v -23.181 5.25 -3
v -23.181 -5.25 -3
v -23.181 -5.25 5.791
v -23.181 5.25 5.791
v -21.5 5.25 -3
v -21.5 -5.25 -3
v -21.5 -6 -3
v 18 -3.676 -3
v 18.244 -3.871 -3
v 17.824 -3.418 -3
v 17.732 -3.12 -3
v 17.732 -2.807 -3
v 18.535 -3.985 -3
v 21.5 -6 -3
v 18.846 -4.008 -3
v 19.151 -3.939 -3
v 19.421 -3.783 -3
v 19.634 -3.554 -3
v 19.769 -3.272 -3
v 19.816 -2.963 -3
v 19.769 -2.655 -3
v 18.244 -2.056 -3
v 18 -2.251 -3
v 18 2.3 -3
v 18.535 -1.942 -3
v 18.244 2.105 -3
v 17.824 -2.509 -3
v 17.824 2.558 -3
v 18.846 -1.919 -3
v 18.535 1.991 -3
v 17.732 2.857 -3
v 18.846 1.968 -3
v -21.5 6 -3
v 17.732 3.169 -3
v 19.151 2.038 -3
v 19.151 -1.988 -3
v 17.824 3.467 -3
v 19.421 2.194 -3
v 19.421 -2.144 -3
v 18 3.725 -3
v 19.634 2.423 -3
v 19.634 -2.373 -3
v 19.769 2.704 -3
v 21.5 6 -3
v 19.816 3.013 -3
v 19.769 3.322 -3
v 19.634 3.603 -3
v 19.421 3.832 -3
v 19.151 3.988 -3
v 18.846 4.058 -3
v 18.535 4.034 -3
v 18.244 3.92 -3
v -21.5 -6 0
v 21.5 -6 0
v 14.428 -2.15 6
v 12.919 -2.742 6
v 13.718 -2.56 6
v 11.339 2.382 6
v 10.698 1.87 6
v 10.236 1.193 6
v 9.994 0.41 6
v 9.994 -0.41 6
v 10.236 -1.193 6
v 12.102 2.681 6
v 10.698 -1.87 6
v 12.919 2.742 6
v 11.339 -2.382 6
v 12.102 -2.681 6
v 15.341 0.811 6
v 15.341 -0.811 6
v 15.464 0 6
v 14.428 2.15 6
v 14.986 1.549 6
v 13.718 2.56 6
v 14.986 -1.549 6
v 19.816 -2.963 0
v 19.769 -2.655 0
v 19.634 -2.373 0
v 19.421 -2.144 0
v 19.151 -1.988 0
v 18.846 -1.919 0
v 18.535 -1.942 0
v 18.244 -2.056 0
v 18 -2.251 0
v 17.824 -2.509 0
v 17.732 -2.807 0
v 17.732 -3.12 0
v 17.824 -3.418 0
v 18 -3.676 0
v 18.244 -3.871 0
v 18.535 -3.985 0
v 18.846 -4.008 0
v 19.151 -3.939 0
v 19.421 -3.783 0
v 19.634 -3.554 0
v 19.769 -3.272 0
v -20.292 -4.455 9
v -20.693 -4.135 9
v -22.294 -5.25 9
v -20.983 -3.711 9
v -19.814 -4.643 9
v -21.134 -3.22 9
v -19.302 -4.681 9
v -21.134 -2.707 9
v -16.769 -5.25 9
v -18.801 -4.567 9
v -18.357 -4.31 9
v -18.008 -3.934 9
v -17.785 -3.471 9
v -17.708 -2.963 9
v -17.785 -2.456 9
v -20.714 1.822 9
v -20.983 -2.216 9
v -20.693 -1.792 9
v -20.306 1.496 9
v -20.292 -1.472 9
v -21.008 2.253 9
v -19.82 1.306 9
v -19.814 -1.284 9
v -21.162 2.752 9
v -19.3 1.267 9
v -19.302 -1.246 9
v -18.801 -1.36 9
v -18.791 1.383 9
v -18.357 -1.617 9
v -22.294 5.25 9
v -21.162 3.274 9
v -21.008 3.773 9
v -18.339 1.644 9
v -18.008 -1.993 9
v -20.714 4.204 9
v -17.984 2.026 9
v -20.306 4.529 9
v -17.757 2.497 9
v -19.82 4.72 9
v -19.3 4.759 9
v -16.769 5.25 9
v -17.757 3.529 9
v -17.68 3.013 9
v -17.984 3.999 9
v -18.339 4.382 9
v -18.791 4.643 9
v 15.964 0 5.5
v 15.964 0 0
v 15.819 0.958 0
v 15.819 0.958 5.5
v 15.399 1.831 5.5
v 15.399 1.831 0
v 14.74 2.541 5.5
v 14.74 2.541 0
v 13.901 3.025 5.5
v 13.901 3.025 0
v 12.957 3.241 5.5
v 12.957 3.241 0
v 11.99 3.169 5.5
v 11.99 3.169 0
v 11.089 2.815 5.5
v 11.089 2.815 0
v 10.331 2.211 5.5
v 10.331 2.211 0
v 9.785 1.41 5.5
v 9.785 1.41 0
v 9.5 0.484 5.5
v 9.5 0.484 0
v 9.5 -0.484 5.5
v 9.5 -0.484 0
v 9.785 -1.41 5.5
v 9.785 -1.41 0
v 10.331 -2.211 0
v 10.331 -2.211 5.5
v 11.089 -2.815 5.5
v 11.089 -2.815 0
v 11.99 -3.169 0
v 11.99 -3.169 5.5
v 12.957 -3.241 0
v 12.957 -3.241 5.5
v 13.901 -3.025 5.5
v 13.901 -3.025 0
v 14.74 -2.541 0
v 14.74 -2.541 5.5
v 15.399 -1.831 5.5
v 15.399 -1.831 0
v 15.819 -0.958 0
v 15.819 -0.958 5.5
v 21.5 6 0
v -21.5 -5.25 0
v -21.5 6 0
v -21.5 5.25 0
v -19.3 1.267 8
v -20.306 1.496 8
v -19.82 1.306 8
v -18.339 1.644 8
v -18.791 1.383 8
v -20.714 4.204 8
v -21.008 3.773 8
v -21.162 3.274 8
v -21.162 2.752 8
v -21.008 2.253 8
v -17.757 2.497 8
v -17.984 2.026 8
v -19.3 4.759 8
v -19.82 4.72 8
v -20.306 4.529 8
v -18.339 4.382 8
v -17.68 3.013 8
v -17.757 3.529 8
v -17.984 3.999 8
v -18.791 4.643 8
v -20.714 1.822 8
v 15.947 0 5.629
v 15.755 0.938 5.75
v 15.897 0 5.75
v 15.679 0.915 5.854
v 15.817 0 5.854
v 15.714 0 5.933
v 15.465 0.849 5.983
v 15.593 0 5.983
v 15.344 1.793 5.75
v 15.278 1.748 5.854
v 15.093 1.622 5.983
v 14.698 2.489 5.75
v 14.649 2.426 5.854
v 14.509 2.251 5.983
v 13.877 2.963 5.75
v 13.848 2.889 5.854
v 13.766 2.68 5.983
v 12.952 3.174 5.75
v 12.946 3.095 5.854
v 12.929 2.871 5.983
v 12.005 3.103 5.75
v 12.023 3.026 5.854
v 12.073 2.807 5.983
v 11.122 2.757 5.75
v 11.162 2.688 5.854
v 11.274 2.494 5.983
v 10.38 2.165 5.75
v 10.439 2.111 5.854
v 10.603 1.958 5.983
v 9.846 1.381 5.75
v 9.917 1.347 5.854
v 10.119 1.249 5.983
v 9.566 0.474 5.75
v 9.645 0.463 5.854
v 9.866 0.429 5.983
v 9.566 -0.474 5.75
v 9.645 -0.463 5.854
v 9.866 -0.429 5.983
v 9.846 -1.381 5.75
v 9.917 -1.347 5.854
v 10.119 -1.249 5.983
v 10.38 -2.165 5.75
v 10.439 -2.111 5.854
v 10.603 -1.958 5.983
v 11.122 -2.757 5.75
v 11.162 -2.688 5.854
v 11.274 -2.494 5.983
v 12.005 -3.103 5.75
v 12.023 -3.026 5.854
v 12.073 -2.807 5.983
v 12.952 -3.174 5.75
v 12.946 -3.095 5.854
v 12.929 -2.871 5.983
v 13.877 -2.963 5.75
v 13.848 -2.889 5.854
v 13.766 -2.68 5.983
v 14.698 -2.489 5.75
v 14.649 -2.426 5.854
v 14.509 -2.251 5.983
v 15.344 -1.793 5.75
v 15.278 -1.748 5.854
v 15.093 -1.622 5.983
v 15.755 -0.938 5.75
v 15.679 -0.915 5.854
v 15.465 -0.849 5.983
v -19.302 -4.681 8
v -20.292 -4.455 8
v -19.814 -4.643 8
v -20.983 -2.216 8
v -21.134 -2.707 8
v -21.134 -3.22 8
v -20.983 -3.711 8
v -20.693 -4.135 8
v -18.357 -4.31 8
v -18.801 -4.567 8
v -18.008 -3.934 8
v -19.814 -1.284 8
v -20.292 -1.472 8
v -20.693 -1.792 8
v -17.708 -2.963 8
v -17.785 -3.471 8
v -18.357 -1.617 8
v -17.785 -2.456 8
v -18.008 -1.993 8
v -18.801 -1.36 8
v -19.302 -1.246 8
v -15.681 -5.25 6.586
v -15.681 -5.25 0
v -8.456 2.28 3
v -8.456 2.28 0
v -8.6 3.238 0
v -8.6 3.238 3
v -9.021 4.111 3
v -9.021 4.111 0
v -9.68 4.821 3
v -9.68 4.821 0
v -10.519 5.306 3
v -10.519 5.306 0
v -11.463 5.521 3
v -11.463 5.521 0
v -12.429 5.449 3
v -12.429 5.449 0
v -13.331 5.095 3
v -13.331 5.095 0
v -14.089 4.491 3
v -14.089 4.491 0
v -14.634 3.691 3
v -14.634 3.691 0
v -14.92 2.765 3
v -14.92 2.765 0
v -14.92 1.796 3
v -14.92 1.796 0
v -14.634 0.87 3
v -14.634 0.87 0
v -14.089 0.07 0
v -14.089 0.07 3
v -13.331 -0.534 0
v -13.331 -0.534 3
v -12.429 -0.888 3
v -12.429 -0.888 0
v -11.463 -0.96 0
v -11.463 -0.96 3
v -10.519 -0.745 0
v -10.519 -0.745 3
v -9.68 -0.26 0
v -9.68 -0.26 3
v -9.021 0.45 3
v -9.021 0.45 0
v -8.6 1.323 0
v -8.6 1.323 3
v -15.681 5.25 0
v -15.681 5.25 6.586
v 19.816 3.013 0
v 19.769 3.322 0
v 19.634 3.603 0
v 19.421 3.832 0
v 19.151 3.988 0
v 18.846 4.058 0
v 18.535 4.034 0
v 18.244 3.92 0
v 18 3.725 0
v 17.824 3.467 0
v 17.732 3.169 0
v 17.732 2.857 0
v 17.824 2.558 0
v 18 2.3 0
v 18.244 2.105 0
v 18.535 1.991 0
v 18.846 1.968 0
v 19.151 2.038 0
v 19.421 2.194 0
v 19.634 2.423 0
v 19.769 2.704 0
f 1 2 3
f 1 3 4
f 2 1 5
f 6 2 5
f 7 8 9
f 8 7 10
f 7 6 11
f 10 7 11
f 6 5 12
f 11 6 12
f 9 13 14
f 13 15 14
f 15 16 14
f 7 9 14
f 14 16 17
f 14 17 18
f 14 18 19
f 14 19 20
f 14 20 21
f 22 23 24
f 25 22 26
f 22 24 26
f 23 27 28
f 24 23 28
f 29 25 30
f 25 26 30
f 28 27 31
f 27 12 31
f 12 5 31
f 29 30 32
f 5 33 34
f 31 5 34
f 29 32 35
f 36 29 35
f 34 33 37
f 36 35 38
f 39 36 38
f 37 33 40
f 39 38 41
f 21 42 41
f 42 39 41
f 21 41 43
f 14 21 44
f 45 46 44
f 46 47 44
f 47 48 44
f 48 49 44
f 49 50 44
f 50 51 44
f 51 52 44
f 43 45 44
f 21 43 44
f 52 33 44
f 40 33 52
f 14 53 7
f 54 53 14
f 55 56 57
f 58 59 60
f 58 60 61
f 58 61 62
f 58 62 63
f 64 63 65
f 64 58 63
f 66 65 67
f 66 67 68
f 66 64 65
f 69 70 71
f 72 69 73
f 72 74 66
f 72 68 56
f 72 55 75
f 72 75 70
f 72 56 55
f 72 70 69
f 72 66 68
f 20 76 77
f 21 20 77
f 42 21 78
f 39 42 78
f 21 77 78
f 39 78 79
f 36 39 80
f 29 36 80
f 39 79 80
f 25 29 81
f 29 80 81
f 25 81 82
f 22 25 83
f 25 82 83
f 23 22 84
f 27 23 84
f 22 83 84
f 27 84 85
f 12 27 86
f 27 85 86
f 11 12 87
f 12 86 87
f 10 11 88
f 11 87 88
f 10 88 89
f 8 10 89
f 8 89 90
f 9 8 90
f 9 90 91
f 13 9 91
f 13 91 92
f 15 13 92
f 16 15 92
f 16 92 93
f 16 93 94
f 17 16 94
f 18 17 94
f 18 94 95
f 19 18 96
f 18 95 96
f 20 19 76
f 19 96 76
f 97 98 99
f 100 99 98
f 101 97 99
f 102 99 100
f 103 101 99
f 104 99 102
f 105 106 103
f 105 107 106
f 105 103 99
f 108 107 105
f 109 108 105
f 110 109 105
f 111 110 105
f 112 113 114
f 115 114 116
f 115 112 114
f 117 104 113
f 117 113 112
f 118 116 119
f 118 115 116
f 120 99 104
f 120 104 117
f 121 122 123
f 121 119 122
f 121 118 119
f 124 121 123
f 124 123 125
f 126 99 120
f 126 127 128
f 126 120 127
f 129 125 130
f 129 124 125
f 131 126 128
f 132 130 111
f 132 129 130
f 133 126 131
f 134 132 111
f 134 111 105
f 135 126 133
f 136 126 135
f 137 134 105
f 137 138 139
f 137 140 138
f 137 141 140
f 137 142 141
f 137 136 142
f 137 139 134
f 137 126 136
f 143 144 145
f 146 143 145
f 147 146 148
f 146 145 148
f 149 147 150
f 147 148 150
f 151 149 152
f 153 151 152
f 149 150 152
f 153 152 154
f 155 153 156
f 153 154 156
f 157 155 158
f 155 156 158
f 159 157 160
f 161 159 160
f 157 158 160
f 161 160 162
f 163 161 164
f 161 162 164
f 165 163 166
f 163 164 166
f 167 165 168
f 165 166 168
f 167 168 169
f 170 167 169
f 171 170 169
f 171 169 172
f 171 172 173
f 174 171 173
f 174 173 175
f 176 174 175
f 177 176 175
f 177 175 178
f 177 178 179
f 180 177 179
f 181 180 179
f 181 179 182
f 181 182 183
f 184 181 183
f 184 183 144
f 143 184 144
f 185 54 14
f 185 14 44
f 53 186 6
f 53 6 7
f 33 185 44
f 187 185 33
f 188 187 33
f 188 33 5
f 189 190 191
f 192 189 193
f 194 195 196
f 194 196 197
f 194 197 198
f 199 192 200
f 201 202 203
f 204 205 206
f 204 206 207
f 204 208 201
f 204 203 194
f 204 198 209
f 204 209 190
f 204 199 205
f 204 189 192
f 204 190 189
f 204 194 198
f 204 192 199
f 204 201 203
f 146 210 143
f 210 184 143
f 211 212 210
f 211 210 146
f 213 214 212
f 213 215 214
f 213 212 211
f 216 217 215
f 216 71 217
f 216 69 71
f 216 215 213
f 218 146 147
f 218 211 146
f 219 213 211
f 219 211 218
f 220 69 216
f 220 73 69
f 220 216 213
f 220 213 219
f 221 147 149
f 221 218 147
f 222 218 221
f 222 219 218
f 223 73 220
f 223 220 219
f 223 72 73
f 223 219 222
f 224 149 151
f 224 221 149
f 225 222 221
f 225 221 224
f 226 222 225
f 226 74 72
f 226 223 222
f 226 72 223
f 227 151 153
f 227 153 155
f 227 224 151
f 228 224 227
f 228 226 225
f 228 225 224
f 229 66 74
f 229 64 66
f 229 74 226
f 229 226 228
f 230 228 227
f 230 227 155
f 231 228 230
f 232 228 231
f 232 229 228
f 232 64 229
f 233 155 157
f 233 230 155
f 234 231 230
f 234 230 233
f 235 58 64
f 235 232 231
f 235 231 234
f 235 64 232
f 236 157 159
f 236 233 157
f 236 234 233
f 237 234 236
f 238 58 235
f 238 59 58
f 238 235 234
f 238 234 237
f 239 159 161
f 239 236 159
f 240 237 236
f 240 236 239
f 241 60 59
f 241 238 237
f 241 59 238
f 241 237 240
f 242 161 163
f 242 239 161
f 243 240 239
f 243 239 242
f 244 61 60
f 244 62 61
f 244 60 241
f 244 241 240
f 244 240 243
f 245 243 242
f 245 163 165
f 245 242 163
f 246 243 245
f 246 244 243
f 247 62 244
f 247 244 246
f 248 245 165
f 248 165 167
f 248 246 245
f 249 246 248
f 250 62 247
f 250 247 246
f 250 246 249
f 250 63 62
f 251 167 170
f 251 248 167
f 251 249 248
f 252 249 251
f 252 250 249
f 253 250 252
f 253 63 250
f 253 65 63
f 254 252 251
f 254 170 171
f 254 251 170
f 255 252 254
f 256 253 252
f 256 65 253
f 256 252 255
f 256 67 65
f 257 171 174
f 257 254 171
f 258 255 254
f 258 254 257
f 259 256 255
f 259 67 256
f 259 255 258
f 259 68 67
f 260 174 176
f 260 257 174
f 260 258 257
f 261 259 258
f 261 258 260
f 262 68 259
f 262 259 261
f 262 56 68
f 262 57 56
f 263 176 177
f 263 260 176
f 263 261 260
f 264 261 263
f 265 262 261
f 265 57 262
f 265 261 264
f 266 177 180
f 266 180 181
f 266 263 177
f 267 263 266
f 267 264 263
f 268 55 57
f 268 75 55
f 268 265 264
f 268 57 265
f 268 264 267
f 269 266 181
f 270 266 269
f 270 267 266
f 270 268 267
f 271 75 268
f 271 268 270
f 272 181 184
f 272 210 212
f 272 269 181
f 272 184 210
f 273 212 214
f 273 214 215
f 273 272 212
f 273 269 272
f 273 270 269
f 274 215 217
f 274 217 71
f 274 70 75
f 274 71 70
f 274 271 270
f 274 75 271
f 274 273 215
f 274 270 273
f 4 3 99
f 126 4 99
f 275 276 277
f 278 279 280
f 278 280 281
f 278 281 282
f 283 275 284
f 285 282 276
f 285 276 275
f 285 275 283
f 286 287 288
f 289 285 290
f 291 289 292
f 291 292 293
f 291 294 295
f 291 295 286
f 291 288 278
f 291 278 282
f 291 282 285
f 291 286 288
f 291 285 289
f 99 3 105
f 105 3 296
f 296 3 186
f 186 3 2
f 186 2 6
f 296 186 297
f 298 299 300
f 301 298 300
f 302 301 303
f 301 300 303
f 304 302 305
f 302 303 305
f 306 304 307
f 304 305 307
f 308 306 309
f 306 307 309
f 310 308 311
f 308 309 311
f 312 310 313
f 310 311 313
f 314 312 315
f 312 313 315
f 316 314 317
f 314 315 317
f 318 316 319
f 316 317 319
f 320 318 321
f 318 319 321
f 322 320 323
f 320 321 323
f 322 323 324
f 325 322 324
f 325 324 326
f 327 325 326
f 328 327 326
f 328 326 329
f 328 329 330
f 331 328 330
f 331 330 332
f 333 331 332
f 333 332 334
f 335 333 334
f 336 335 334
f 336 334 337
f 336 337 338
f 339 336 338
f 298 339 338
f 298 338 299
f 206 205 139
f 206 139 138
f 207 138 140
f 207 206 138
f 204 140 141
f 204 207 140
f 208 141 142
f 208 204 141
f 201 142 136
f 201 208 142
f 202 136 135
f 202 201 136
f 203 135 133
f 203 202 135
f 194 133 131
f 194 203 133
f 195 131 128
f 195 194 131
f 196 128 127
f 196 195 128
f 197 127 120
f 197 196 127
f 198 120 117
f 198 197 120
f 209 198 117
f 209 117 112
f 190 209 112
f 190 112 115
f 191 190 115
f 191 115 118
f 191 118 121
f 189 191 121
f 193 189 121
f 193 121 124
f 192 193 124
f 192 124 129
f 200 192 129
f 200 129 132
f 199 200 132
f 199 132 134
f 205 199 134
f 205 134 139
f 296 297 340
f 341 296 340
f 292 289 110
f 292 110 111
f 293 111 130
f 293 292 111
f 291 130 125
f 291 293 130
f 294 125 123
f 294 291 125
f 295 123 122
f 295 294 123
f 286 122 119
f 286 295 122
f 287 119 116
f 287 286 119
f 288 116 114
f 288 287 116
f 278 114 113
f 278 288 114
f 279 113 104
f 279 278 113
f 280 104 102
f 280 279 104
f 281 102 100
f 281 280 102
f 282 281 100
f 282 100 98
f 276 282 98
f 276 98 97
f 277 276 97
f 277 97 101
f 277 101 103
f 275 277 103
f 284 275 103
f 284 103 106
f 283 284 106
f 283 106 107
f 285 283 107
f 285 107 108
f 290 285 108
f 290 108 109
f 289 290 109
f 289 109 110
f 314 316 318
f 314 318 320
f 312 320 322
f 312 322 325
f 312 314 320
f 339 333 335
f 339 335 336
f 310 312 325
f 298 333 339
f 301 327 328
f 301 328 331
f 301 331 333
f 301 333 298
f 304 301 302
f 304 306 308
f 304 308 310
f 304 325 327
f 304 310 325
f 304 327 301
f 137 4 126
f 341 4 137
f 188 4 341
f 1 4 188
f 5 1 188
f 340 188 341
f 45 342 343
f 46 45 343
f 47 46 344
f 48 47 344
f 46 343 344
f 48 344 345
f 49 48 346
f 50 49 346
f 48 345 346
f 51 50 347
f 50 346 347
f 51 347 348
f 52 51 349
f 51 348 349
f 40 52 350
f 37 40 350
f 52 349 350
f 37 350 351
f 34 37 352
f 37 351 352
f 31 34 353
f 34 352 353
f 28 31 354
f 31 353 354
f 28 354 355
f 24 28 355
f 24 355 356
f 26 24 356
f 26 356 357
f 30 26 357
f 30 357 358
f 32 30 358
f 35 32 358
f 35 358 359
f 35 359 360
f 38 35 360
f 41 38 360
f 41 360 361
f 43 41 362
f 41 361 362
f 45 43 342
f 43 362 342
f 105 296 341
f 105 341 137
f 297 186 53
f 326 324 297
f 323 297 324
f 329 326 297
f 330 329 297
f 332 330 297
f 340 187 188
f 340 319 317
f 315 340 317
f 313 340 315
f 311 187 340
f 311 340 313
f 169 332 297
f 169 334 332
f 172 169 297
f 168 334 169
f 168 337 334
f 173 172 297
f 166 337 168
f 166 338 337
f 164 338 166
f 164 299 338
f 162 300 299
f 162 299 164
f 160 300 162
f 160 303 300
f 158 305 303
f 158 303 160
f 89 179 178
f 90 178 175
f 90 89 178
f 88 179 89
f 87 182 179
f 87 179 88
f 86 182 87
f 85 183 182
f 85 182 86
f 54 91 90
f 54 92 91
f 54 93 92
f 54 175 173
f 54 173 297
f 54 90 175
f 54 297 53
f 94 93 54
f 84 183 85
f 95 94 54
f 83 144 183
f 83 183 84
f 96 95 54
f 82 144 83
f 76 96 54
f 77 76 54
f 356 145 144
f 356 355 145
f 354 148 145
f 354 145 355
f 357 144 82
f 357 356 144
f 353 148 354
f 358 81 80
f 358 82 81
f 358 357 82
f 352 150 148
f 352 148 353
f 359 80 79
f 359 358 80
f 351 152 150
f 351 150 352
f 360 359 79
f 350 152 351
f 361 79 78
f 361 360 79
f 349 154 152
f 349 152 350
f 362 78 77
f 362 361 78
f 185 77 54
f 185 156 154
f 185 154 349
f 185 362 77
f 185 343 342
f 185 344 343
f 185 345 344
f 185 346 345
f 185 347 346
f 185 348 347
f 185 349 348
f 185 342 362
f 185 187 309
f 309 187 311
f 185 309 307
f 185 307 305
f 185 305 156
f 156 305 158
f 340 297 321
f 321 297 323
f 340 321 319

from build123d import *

# Parameters (mm, degrees)
ESQUISSE1_R                  = 1.047730405
ESQUISSE1_R_2                = 3.25
BOSS_EXTRU_1_DEPTH           = 3
BOSS_EXTRU_2_DEPTH           = 3
BOSS_EXTRU_2_DEPTH_BACK      = 3
ESQUISSE1_3_R                = 3.25
BOSS_EXTRU_3_DEPTH           = 6
BOSS_EXTRU_3_DEPTH_BACK      = 3
ESQUISSE1_4_R                = 3.25
BOSS_EXTRU_4_DEPTH           = 9
BOSS_EXTRU_4_DEPTH_BACK      = 3
ESQUISSE1_5_W                = 7.5
ESQUISSE1_5_H                = 10.5
ESQUISSE1_5_R                = 1.751165812
ESQUISSE1_5_R_2              = 1.722458175
BOSS_EXTRU_5_DEPTH           = 8
BOSS_EXTRU_5_DEPTH_BACK      = 3
ESQUISSE1_6_R                = 1.751165812
ESQUISSE1_6_R_2              = 1.722458175
ENL_V_MAT_EXTRU_1_DEPTH      = 8
ENL_V_MAT_EXTRU_1_DEPTH_BACK = 8
CONG_1_R                     = 0.5


with BuildPart() as part:
    # Esquisse1 → Boss.-Extru.1 (new body)
    with BuildSketch(Plane.XY):
        Polygon((-21.5, -5.25), (-21.5, -6), (21.5, -6), (21.5, 6), (-21.5, 6), (-21.5, 5.25), (-15.680696028, 5.25), (-15.680696028, -5.25), align=None)
        with Locations((18.767939295, -2.963429097)):
            Circle(ESQUISSE1_R, mode=Mode.SUBTRACT)
        with Locations((-11.706099573, 2.280487387)):
            Circle(ESQUISSE1_R_2, mode=Mode.SUBTRACT)
        with Locations((12.713644898, 0)):
            Circle(ESQUISSE1_R_2, mode=Mode.SUBTRACT)
        with Locations((18.767939295, 3.012819582)):
            Circle(ESQUISSE1_R, mode=Mode.SUBTRACT)
    extrude(amount=-BOSS_EXTRU_1_DEPTH)

    # Esquisse1<3> → Boss.-Extru.2 (add, two sides: drawn at the far end of the back side and taken through both)
    with BuildSketch(Plane.XY.offset(-BOSS_EXTRU_2_DEPTH_BACK)):
        with Locations((-11.706099573, 2.280487387)):
            Circle(ESQUISSE1_3_R)
    extrude(amount=BOSS_EXTRU_2_DEPTH + BOSS_EXTRU_2_DEPTH_BACK)

    # Esquisse1<4> → Boss.-Extru.3 (add, two sides: drawn at the far end of the back side and taken through both)
    with BuildSketch(Plane.XY.offset(-BOSS_EXTRU_3_DEPTH_BACK)):
        with Locations((12.713644898, 0)):
            Circle(ESQUISSE1_4_R)
    extrude(amount=BOSS_EXTRU_3_DEPTH + BOSS_EXTRU_3_DEPTH_BACK)

    # Esquisse1<5> → Boss.-Extru.4 (add, two sides: drawn at the far end of the back side and taken through both)
    with BuildSketch(Plane.XY.offset(-BOSS_EXTRU_4_DEPTH_BACK)):
        with Locations((-19.430696028, 0)):
            Rectangle(ESQUISSE1_5_W, ESQUISSE1_5_H)
        with Locations((-19.430696028, 3.012819582)):
            Circle(ESQUISSE1_5_R, mode=Mode.SUBTRACT)
        with Locations((-19.430696028, -2.963429097)):
            Circle(ESQUISSE1_5_R_2, mode=Mode.SUBTRACT)
    extrude(amount=BOSS_EXTRU_4_DEPTH + BOSS_EXTRU_4_DEPTH_BACK)

    # Esquisse1<6> → Boss.-Extru.5 (add, two sides: drawn at the far end of the back side and taken through both)
    with BuildSketch(Plane.XY.offset(-BOSS_EXTRU_5_DEPTH_BACK)):
        with Locations((-19.430696028, 3.012819582)):
            Circle(ESQUISSE1_6_R)
        with Locations((-19.430696028, -2.963429097)):
            Circle(ESQUISSE1_6_R_2)
    extrude(amount=BOSS_EXTRU_5_DEPTH + BOSS_EXTRU_5_DEPTH_BACK)

    # Esquisse2 → Enlèv. mat.-Extru.1 (cut, two sides: drawn at the far end of the back side and taken through both)
    with BuildSketch(Plane(origin=(0, 0, 0), x_dir=(1, 0, 0), z_dir=(0, 1, 0)).offset(-ENL_V_MAT_EXTRU_1_DEPTH_BACK)):
        Polygon((-23.180696028, -5.790746035), (-22.293736237, -9), (-23.180696028, -9), align=None)
        Polygon((-15.680696028, -6.586297382), (-16.769074106, -9), (-15.680696028, -9), align=None)
    extrude(amount=ENL_V_MAT_EXTRU_1_DEPTH + ENL_V_MAT_EXTRU_1_DEPTH_BACK, mode=Mode.SUBTRACT)

    # Congé1
    cong_1_edges = [part.edges().sort_by_distance(p)[0] for p in [
        (9.463644898, 0, 6),
    ]]
    fillet(cong_1_edges, radius=CONG_1_R)


solid = part.part
